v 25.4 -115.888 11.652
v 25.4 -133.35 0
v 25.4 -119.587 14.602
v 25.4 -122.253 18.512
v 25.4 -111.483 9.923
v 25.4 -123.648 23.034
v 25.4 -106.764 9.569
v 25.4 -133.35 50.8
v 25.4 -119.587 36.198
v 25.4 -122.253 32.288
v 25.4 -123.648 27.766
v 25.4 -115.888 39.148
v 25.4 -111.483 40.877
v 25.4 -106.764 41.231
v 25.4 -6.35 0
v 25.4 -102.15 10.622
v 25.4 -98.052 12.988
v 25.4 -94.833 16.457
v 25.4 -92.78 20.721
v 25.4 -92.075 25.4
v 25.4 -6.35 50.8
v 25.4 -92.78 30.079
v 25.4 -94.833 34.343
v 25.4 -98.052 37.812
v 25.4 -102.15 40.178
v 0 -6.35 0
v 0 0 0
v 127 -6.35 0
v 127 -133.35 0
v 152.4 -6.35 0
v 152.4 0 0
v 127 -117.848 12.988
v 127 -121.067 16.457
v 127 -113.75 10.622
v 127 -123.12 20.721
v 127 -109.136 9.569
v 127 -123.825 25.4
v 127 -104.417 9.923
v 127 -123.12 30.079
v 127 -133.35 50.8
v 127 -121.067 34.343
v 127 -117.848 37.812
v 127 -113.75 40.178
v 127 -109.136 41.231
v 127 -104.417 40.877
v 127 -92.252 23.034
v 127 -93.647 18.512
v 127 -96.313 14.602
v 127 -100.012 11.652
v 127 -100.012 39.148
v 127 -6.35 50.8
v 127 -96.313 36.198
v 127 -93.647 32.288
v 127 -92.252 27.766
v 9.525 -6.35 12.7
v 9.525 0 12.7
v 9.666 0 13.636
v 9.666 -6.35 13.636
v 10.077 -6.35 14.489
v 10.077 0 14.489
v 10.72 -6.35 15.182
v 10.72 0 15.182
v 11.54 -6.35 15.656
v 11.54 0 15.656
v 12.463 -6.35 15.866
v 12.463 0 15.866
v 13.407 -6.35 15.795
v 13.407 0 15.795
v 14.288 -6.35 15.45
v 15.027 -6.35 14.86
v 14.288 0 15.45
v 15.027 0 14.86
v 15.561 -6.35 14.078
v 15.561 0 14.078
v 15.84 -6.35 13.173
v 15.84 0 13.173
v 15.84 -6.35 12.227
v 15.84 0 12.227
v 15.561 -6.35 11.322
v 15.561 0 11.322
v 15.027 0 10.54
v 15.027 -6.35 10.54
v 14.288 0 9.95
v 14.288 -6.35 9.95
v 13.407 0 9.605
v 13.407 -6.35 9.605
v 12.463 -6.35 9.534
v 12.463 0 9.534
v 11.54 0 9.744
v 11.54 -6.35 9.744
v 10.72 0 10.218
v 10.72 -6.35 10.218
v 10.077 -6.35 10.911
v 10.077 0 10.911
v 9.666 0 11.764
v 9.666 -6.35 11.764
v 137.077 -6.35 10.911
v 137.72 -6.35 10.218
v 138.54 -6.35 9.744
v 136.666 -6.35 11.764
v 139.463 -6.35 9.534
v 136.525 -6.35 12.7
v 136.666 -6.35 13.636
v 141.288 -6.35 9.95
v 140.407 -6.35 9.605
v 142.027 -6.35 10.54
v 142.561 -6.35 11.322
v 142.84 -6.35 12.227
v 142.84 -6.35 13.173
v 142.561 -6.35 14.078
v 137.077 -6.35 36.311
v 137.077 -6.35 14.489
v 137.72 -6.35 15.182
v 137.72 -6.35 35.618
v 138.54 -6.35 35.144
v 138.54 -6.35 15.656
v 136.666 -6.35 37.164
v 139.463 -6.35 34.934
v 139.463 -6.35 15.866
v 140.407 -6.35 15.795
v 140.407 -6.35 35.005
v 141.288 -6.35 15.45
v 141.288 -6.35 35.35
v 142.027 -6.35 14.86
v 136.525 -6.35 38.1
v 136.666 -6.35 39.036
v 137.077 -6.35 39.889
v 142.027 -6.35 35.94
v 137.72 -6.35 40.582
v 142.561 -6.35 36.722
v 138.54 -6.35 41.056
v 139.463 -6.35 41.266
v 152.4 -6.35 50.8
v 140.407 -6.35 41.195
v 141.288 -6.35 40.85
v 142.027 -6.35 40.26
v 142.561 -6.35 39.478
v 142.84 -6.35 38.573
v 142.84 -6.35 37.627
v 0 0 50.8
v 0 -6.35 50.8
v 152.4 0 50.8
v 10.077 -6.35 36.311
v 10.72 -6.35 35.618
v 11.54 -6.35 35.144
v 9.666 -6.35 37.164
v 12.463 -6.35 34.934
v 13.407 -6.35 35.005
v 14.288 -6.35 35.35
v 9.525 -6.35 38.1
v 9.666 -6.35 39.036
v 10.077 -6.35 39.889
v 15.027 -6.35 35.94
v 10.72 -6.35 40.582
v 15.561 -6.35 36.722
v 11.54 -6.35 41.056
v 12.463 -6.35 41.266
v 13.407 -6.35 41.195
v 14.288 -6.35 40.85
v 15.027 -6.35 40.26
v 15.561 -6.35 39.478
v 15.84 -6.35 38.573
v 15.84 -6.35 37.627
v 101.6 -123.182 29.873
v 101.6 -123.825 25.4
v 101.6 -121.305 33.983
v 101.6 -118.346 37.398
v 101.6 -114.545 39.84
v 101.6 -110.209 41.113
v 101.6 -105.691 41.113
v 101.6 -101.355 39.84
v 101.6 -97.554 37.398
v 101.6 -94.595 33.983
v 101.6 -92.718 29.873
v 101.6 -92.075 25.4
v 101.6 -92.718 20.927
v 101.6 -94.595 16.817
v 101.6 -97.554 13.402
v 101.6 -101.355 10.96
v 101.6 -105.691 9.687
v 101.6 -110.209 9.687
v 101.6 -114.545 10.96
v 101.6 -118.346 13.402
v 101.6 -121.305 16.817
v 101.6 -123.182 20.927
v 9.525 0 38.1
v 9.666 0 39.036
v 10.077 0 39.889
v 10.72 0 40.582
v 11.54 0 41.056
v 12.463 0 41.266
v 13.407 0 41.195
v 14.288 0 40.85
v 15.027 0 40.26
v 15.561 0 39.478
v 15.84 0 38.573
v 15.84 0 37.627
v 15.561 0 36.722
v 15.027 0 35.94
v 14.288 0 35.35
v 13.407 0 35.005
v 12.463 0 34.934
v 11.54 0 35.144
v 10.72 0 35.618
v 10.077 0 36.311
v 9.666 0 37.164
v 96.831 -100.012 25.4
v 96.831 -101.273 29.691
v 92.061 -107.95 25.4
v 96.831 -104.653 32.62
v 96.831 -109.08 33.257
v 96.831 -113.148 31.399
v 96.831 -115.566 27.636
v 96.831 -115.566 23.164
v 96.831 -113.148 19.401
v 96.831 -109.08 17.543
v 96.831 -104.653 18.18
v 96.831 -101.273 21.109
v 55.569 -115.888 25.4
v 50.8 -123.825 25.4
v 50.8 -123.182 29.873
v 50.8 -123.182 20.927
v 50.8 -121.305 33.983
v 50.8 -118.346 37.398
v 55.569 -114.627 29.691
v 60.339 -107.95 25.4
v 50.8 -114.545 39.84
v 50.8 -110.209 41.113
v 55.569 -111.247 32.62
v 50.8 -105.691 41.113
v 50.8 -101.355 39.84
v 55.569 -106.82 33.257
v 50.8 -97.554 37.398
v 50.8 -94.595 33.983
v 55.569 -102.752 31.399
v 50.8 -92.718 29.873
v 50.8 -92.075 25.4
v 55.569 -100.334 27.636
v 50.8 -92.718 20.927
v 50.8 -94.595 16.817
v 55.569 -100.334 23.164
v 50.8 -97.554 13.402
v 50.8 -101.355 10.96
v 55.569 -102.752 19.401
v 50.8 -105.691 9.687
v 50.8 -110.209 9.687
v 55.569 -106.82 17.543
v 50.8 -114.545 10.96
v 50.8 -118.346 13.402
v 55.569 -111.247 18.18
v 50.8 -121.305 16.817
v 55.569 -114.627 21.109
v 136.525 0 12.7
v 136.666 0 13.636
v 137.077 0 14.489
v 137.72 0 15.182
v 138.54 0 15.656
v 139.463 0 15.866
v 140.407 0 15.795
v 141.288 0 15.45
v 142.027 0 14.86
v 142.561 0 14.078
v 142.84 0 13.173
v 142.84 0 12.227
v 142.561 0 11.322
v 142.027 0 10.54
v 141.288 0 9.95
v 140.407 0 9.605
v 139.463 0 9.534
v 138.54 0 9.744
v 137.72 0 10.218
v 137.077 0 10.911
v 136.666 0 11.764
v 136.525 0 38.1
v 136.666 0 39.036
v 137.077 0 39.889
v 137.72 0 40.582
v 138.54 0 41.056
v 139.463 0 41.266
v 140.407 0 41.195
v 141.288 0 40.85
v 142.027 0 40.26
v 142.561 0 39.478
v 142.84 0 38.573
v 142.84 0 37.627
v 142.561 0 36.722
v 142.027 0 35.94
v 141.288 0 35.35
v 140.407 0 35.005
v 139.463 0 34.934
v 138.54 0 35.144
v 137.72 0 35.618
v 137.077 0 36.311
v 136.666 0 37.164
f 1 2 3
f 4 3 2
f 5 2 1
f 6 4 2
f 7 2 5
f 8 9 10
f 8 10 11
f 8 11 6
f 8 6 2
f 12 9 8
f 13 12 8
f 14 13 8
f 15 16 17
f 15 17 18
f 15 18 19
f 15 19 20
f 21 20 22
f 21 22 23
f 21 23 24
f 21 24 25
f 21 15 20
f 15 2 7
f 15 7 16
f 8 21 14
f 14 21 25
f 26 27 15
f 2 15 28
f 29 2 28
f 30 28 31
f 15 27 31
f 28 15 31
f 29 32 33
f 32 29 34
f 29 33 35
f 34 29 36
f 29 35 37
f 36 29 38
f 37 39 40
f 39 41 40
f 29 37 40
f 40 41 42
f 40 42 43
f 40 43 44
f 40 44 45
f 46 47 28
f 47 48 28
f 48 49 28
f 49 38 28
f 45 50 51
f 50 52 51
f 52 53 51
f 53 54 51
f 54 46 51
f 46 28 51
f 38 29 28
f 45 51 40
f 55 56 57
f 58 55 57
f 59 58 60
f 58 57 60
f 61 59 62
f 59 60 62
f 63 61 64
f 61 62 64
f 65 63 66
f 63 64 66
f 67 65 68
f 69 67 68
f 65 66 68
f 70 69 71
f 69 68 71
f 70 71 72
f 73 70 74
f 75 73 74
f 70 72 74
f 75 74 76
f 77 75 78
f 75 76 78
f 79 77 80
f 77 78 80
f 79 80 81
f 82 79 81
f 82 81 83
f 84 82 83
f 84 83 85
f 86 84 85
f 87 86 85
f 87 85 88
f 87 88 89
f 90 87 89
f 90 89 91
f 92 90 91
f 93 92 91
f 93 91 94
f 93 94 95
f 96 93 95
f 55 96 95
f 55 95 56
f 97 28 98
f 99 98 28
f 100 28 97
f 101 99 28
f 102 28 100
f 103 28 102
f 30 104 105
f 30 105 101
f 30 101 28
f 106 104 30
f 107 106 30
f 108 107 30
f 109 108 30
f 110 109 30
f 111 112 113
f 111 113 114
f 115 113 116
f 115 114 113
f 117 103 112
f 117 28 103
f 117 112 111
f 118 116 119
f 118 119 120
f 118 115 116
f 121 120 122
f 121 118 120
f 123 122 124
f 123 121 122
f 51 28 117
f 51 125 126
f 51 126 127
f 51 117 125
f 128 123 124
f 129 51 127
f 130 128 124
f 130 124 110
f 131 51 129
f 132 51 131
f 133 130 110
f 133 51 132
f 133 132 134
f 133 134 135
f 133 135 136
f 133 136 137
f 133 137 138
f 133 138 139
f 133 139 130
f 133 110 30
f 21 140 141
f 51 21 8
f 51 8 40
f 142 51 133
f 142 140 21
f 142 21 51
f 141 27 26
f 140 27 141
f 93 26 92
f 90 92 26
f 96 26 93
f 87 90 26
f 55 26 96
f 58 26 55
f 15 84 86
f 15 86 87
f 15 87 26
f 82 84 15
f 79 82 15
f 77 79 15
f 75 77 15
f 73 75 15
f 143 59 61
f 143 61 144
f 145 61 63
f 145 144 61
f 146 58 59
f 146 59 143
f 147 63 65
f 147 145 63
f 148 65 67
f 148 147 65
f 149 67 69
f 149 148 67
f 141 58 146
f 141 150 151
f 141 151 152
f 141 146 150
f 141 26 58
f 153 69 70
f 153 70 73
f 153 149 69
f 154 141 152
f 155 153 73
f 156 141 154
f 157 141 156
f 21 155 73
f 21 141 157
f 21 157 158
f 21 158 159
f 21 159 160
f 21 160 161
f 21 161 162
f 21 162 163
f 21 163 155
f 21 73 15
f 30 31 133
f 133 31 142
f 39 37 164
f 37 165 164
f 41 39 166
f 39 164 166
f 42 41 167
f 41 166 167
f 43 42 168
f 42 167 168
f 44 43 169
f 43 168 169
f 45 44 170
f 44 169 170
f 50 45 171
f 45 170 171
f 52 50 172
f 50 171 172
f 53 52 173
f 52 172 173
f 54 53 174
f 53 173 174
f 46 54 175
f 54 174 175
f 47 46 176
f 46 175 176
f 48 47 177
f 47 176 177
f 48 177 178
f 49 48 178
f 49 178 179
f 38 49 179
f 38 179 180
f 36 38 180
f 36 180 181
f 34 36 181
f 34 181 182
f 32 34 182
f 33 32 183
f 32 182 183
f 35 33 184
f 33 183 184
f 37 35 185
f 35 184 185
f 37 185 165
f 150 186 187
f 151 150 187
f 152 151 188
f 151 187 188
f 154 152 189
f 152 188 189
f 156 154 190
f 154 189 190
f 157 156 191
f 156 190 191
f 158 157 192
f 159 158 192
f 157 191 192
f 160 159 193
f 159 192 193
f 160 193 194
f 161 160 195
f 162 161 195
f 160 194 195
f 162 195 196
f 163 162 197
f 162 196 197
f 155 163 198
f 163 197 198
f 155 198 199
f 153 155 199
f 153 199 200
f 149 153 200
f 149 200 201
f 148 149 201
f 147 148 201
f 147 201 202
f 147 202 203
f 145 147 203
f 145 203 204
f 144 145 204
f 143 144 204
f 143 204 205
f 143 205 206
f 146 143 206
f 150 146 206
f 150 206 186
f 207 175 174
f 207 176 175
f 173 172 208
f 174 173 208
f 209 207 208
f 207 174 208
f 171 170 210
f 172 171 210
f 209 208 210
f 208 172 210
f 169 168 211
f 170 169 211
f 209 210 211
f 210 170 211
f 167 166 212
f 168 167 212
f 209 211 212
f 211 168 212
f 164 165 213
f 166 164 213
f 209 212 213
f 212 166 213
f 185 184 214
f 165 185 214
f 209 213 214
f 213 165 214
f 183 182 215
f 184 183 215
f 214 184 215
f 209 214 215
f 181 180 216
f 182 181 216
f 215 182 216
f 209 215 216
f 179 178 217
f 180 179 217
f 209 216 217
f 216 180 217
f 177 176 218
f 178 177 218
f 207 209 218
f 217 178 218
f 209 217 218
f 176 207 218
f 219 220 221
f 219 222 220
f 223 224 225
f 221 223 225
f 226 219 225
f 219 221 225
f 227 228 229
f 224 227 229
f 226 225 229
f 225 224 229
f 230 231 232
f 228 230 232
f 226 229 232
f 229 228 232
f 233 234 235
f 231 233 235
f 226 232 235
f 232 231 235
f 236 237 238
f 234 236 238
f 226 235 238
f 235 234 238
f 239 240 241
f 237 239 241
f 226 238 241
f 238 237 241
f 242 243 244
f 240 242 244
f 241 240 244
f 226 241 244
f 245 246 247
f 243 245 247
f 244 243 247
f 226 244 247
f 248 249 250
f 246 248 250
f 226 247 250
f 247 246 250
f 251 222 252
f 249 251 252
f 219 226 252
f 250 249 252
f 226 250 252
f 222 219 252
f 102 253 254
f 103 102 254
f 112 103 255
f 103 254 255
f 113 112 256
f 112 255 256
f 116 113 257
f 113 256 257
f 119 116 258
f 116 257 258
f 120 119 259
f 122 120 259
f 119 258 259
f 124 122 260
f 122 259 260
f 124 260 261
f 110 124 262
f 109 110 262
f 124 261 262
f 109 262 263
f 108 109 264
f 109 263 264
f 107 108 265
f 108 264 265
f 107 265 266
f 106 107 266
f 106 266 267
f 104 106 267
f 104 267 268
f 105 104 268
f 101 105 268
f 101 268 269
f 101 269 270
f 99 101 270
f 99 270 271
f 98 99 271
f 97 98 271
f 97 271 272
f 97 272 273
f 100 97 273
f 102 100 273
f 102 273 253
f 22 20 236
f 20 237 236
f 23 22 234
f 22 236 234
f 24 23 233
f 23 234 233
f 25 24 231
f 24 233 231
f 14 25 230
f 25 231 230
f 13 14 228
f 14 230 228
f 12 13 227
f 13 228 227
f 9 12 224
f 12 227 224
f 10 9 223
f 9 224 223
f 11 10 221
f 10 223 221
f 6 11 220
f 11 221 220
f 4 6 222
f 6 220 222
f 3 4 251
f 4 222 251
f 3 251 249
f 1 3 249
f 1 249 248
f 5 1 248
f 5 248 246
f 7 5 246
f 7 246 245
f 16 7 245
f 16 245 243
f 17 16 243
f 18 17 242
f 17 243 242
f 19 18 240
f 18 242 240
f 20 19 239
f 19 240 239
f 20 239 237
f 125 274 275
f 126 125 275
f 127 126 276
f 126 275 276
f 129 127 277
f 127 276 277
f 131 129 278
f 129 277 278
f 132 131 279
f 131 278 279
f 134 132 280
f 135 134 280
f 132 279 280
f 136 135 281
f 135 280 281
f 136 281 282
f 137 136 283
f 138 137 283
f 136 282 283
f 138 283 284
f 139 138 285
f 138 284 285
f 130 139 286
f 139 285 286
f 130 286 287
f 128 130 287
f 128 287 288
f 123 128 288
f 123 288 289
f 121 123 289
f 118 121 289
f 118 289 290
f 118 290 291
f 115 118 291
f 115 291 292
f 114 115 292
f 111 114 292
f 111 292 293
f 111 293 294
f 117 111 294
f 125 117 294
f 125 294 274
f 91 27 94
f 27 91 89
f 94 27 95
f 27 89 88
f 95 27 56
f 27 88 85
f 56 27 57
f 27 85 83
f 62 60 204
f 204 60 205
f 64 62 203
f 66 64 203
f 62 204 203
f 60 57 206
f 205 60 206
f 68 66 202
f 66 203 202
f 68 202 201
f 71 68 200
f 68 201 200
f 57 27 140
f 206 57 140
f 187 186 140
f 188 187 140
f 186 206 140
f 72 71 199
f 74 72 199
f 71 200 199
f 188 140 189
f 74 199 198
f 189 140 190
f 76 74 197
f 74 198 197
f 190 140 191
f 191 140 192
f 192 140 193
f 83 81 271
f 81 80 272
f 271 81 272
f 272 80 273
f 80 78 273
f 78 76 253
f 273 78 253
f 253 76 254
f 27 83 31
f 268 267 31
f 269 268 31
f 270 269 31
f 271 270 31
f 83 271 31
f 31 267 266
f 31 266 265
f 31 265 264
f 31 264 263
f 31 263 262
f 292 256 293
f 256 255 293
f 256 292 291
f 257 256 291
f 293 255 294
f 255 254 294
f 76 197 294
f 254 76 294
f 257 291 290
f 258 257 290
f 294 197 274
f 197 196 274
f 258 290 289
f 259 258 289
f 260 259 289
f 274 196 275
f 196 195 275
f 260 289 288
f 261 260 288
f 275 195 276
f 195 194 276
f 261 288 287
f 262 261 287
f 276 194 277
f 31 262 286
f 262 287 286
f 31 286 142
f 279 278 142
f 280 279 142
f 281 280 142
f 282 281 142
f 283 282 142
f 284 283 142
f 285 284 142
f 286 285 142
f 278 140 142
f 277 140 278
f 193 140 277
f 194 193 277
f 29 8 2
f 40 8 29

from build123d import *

# Parameters (mm, degrees)
F0_W     = 152.4
F0_H     = 50.8
F1_DEPTH = 6.35
F3_D     = 6.35
F4_W     = 101.6
F4_H     = 50.8
F5_DEPTH = 127
F7_D     = 31.75
F7_DEPTH = 25.4
F7_TIP   = 9.5386623271
F9_D     = 31.75
F9_DEPTH = 25.4
F9_TIP   = 9.5386623271


with BuildPart() as f1:
    # F0 (on Front) → F1 (new body)
    with BuildSketch(Plane.XZ):
        with Locations((76.2, 25.4)):
            Rectangle(F0_W, F0_H)
    extrude(amount=F1_DEPTH)

    # F3 (through all)
    with Locations(Plane.XZ.offset(6.35)):
        with Locations((12.7, 38.1), (12.7, 12.7), (139.7, 38.1), (139.7, 12.7)):
            Hole(F3_D / 2)

    # F4 (on face) → F5 (join)
    with BuildSketch(Plane.XZ.offset(6.35)):
        with Locations((76.2, 25.4)):
            Rectangle(F4_W, F4_H)
    extrude(amount=F5_DEPTH)

    # F7
    with Locations(Plane.YZ.offset(127)):
        with Locations((-107.95, 25.4)):
            Hole(F7_D / 2, depth=F7_DEPTH)
            with Locations((0, 0, -(F7_DEPTH + F7_TIP / 2))):  # 118° drill point
                Cone(0, F7_D / 2, F7_TIP, mode=Mode.SUBTRACT)

    # F9
    with Locations(Plane(origin=(25.4, 0, 0), x_dir=(0, -1, 0), z_dir=(-1, 0, 0))):
        with Locations((107.95, 25.4)):
            Hole(F9_D / 2, depth=F9_DEPTH)
            with Locations((0, 0, -(F9_DEPTH + F9_TIP / 2))):  # 118° drill point
                Cone(0, F9_D / 2, F9_TIP, mode=Mode.SUBTRACT)


solid = f1.part
